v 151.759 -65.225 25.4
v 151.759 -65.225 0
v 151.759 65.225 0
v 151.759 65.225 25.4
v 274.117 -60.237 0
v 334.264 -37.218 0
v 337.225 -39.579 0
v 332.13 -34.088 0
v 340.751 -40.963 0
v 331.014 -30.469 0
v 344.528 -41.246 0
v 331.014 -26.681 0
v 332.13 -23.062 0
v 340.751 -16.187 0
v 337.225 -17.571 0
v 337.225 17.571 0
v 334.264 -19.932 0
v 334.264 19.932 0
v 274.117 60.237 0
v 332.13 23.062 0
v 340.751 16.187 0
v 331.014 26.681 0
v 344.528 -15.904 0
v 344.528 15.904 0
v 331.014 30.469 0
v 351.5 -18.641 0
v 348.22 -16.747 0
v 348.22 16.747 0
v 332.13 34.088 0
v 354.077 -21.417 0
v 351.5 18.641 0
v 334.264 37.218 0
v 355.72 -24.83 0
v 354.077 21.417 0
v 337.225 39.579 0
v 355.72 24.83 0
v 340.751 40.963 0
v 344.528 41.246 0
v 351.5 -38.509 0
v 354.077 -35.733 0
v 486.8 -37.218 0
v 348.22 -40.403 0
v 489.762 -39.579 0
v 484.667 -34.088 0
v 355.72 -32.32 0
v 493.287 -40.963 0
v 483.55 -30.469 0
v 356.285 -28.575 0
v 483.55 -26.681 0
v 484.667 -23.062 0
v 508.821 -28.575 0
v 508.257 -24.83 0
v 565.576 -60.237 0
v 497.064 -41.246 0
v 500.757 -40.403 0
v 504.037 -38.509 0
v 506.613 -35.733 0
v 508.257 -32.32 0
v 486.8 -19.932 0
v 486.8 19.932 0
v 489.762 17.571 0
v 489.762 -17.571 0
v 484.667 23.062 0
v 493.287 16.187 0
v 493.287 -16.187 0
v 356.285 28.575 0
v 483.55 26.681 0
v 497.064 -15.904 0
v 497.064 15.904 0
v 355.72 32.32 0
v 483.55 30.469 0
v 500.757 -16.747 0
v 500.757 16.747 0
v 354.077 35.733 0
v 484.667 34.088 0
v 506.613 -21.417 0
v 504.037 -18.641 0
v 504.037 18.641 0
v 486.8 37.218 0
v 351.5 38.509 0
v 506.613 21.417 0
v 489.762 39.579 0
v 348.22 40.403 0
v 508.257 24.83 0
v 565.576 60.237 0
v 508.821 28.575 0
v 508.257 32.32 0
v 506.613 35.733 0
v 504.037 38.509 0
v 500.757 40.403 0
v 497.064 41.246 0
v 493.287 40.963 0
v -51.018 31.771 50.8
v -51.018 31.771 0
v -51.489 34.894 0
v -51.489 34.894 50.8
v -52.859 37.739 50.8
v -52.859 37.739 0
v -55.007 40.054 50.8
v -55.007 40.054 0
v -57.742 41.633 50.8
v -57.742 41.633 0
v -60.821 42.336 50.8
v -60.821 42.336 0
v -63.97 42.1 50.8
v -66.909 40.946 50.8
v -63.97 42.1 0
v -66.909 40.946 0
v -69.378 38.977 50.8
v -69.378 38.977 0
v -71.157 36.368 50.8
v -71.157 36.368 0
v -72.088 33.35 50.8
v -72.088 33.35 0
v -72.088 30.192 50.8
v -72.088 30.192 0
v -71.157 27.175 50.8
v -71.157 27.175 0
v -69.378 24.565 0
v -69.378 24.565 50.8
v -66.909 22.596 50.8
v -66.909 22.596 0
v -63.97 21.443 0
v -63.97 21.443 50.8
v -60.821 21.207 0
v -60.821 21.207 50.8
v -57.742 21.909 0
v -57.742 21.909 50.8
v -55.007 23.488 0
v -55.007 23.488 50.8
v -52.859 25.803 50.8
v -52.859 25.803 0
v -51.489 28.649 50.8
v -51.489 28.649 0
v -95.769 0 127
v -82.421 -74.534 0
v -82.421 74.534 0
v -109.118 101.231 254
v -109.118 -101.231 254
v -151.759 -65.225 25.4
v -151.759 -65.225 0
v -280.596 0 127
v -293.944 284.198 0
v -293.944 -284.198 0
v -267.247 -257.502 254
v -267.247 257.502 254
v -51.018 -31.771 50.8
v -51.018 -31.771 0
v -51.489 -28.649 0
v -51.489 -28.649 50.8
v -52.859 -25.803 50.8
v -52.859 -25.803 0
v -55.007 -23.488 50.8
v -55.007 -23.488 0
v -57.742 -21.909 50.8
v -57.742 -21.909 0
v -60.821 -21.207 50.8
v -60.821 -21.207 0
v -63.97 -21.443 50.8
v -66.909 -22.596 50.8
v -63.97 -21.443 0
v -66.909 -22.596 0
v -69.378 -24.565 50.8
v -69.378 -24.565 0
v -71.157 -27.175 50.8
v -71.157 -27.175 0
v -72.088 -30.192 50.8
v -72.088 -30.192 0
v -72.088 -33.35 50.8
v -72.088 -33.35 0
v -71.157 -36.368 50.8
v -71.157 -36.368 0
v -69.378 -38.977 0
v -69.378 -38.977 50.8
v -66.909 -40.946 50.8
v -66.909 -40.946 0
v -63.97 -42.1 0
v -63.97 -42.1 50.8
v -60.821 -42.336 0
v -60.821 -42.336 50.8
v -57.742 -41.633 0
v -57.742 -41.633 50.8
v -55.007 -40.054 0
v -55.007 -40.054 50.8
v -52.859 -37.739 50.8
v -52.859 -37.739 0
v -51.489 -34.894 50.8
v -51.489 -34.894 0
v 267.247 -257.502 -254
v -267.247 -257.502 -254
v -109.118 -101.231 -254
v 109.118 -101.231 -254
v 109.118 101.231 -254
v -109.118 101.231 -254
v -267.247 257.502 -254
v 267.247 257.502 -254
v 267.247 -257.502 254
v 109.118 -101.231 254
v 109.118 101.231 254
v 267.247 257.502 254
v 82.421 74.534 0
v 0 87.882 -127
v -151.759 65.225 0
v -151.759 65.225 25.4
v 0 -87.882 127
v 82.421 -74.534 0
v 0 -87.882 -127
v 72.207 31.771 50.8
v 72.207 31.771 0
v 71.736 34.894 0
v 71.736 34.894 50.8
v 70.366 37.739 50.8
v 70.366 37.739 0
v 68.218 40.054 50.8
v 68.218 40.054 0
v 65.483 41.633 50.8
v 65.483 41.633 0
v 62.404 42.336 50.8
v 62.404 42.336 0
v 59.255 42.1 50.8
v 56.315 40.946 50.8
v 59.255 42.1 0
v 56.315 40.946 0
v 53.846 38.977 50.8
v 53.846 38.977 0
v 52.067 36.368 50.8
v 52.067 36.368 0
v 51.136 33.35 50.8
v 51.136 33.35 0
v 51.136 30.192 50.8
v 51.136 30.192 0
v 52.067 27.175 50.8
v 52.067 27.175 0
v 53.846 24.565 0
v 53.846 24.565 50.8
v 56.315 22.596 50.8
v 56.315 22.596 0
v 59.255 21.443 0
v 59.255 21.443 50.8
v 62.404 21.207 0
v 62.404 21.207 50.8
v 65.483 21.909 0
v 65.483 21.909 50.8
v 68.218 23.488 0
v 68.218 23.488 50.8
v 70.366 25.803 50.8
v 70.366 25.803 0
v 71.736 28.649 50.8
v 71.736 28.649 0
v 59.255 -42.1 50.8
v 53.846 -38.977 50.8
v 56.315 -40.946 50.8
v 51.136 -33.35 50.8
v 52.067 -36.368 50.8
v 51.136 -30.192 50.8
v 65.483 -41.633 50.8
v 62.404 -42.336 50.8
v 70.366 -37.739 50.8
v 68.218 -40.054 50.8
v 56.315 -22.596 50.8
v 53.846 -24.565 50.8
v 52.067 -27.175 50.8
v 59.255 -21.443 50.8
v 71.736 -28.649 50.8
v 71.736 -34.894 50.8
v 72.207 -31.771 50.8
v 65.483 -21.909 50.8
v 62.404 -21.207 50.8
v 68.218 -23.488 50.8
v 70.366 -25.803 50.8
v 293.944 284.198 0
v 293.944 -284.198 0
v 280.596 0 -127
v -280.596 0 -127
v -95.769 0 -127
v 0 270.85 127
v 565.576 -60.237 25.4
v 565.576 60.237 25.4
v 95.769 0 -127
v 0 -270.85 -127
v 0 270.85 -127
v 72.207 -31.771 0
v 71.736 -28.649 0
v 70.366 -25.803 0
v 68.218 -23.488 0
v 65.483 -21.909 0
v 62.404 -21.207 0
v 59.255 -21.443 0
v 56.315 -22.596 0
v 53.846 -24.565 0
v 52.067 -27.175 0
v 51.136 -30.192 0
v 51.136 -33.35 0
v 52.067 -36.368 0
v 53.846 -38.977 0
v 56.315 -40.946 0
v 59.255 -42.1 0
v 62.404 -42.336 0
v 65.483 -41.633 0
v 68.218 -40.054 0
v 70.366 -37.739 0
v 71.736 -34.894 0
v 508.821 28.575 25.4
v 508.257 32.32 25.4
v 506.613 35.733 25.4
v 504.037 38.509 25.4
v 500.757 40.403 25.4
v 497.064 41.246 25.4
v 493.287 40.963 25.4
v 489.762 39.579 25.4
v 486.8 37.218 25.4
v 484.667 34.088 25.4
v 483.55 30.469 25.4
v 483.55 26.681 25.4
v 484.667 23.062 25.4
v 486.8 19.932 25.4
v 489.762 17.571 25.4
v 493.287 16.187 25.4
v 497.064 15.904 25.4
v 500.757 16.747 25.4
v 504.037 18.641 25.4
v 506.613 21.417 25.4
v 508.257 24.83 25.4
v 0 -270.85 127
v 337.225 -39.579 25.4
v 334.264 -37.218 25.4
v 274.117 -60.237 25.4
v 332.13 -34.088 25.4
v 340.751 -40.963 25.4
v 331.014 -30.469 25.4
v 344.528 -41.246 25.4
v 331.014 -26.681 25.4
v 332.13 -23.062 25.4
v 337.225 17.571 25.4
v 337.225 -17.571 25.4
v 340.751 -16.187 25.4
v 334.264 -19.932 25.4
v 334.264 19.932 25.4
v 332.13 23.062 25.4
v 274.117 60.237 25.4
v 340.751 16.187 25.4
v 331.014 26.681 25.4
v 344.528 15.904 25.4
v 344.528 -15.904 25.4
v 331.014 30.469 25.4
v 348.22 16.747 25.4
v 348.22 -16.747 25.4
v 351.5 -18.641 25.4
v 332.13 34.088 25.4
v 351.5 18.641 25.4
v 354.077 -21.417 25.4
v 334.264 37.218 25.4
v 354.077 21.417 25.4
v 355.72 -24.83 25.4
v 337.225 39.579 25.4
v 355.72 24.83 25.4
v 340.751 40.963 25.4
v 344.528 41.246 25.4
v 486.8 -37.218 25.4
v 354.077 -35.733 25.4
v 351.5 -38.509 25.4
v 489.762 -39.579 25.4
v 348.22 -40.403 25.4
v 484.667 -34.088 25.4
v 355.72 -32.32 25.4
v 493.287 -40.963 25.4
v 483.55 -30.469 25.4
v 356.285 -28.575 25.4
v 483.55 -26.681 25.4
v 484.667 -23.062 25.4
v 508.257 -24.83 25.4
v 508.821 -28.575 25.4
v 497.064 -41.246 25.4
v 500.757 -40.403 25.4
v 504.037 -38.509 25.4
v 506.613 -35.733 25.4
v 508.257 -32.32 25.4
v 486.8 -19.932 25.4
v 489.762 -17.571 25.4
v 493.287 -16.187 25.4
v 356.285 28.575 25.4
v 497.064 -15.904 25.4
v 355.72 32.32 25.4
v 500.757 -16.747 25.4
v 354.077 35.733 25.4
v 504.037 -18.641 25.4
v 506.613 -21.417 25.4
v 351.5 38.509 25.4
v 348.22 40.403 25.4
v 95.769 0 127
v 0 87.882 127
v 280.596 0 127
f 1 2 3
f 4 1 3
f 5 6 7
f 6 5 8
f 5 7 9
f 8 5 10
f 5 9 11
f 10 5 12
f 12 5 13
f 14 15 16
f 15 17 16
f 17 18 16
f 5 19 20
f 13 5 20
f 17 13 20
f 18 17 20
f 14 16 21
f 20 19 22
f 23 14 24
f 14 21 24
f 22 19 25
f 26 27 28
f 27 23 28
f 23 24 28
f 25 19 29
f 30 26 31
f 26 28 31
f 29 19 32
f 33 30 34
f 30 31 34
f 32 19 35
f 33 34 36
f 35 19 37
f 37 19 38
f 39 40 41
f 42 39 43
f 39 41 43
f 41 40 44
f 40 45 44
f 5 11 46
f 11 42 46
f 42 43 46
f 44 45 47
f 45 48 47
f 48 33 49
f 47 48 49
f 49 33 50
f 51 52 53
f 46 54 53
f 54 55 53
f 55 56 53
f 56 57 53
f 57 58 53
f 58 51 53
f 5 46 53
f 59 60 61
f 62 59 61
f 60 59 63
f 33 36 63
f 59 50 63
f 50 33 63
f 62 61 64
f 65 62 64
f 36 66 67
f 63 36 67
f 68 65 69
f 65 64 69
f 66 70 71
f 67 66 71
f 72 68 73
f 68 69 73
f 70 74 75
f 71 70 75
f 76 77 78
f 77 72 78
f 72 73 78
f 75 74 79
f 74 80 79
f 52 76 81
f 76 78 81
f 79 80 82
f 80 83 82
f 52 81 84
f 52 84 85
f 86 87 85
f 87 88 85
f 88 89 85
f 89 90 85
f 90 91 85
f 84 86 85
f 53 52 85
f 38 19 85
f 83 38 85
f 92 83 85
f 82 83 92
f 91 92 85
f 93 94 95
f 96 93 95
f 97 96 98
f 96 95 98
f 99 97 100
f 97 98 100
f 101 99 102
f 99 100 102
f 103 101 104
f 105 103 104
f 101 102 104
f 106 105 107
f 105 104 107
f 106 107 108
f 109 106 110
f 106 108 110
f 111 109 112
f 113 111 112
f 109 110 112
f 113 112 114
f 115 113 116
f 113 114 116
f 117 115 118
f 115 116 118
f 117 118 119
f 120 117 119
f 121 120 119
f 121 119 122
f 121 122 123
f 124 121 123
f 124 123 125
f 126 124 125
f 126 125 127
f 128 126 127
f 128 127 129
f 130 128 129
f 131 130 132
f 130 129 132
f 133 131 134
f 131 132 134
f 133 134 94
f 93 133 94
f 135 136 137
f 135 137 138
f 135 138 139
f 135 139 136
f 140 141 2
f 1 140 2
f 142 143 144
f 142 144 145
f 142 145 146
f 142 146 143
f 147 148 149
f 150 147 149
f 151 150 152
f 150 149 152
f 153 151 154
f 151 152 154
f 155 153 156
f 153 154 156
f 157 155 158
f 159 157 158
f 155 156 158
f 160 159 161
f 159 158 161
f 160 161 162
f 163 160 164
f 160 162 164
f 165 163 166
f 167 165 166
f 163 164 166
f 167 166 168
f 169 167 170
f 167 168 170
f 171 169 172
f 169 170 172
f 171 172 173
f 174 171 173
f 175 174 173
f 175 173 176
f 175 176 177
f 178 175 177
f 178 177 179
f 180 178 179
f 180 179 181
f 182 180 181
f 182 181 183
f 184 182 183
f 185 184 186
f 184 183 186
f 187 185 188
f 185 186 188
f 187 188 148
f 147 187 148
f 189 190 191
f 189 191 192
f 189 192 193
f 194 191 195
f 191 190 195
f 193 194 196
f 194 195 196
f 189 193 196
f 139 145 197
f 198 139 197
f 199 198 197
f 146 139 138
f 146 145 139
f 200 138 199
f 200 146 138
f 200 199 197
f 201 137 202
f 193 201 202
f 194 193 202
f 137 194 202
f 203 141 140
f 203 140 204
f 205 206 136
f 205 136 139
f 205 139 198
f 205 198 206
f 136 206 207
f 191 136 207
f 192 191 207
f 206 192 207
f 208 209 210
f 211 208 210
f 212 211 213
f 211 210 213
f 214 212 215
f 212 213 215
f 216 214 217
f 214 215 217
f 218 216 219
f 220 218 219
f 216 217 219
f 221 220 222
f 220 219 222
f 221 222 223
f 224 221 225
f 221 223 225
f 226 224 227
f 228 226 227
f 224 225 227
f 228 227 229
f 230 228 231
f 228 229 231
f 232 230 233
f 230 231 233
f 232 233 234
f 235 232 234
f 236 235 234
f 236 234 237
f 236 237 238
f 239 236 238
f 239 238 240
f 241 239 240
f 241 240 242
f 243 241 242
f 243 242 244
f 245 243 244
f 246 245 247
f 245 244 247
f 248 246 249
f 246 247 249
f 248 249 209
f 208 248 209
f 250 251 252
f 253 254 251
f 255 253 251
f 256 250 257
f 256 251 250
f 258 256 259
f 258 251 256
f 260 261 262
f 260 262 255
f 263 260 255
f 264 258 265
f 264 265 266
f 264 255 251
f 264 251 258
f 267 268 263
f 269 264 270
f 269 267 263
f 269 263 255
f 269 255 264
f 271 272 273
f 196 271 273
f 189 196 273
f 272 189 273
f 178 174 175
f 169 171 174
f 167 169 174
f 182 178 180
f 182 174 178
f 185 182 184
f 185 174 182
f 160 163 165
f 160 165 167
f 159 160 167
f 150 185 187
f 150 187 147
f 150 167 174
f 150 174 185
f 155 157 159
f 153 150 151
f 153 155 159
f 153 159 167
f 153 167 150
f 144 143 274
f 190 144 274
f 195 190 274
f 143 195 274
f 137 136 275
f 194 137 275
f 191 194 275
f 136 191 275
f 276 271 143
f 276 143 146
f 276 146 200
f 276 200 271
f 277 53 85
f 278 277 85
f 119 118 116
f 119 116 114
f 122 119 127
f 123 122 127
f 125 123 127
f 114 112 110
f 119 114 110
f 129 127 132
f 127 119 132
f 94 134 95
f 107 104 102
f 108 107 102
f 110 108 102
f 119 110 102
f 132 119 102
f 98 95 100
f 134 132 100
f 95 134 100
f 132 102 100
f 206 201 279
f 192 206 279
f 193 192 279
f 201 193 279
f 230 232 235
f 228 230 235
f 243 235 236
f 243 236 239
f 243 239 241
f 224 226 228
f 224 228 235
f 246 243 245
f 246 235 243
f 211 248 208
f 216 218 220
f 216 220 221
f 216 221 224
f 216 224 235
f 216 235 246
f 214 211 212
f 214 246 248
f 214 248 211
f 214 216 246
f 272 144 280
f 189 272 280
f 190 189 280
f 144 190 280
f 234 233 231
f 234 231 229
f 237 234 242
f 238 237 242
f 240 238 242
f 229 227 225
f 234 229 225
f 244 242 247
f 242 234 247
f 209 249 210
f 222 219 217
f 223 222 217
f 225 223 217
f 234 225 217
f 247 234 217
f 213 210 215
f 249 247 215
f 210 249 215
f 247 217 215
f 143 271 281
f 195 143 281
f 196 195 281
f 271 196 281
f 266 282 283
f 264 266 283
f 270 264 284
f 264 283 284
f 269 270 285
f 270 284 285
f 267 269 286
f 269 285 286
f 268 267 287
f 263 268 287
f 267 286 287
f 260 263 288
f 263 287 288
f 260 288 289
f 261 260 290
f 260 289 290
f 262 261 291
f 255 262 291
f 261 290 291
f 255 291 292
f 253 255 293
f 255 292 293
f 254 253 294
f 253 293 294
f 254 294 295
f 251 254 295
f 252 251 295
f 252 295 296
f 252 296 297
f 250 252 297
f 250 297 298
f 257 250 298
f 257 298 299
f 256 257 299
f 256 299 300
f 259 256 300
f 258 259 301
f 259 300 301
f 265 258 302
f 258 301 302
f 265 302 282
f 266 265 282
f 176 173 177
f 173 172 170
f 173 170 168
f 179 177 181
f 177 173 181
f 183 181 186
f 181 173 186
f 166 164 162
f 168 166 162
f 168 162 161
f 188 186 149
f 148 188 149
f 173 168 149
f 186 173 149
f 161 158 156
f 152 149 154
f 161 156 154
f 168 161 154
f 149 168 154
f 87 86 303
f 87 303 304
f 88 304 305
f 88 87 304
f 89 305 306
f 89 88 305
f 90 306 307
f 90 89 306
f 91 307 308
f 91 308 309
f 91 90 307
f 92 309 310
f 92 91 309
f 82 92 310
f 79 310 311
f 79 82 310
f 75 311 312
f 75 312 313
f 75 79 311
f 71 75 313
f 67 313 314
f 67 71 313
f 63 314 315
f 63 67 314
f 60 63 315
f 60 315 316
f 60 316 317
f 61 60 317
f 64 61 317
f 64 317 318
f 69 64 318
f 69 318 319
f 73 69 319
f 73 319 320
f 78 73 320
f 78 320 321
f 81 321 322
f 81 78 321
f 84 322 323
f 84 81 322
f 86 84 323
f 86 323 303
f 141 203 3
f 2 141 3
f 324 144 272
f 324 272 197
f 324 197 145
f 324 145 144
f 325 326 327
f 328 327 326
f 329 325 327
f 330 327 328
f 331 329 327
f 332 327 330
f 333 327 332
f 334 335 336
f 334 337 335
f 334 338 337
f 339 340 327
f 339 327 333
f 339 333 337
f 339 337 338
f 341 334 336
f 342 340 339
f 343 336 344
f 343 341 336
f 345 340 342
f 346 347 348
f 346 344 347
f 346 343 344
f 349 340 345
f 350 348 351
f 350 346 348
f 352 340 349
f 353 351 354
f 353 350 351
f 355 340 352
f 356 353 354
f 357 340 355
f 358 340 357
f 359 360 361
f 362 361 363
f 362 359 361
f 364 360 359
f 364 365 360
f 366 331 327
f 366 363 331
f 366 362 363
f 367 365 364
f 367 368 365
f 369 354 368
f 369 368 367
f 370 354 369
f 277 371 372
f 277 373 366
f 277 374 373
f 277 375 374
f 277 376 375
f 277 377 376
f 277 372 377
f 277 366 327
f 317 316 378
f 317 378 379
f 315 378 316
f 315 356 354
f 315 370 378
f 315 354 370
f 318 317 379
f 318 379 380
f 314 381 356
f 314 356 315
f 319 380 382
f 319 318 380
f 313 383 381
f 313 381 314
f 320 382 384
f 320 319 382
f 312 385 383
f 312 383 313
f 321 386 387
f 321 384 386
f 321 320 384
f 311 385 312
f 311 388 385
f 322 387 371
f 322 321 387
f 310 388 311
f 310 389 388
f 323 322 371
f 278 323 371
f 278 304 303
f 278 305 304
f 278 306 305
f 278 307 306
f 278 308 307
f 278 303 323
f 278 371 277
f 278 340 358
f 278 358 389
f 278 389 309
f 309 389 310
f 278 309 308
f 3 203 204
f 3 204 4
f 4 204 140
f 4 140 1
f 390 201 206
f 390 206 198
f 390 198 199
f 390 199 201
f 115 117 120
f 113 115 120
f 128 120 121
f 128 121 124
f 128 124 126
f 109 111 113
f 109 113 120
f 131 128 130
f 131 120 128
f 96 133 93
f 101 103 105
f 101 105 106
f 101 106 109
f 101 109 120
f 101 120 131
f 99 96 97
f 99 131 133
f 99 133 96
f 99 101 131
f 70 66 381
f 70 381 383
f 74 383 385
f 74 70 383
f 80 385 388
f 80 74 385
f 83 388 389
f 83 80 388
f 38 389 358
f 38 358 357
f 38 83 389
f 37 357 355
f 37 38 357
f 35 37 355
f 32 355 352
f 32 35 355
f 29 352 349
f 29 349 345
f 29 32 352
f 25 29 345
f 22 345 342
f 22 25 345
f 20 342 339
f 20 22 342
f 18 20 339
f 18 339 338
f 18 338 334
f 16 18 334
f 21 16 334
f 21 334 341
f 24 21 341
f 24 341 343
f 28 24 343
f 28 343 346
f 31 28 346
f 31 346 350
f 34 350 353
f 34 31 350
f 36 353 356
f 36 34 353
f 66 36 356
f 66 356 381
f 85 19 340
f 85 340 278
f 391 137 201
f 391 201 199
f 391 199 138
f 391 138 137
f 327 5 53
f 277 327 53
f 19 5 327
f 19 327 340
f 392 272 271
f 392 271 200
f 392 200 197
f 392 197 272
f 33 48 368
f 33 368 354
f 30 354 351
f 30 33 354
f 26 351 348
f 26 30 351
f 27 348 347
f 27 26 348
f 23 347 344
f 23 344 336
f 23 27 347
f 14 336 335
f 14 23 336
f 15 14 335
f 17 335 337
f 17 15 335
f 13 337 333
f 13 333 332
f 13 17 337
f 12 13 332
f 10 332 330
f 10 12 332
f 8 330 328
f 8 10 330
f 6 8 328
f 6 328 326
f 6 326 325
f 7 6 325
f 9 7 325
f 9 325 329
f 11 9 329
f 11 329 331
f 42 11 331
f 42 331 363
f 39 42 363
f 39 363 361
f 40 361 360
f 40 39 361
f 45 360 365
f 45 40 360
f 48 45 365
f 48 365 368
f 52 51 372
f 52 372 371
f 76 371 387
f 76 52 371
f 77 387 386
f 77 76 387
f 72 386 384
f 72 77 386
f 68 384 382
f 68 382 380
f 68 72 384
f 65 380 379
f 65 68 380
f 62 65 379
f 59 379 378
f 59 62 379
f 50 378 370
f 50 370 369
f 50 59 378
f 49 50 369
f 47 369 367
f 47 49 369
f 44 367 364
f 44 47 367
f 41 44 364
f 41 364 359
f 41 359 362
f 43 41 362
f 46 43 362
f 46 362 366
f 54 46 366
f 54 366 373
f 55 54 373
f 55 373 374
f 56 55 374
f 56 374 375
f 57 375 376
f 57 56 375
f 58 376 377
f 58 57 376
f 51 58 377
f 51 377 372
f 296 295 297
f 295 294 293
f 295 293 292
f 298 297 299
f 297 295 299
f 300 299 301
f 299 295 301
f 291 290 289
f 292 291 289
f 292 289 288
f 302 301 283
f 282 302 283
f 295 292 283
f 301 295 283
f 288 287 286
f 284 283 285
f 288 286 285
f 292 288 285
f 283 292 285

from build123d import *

# Parameters (mm, degrees)
F0_W     = 303.5179972649
F0_H     = 130.4491758347
F1_DEPTH = 25.4
F2_R     = 10.594213
F3_DEPTH = 50.8
F4_W     = 291.4582490921
F4_H     = 120.4743683338
F4_R     = 12.70635
F5_DEPTH = 25.4
F6_W     = 587.8875851631
F6_H     = 568.3960914612
F6_W_2   = 164.8424863815
F6_H_2   = 149.0684151649
F7_DEPTH = 254
F7_TAPER = 6


with BuildPart() as f1:
    # F0 (on Top) → F1 (new body)
    with BuildSketch(Plane.XY):
        Rectangle(F0_W, F0_H)
    extrude(amount=F1_DEPTH)


with BuildPart() as f3:
    # F2 (on Top) → F3 (new body)
    with BuildSketch(Plane.XY):
        with Locations((61.6123527288, -31.7712649703)):
            Circle(F2_R)
    extrude(amount=F3_DEPTH)


with BuildPart() as f3b:
    # F2 (on Top) → F3, piece 2 (new body)
    with BuildSketch(Plane.XY):
        with Locations((61.6123527288, 31.7712649703)):
            Circle(F2_R)
    extrude(amount=F3_DEPTH)


with BuildPart() as f3c:
    # F2 (on Top) → F3, piece 3 (new body)
    with BuildSketch(Plane.XY):
        with Locations((-61.6123527288, 31.7712649703)):
            Circle(F2_R)
    extrude(amount=F3_DEPTH)


with BuildPart() as f3d:
    # F2 (on Top) → F3, piece 4 (new body)
    with BuildSketch(Plane.XY):
        with Locations((-61.6123527288, -31.7712649703)):
            Circle(F2_R)
    extrude(amount=F3_DEPTH)


with BuildPart() as f5:
    # F4 (on Top) → F5 (new body)
    with BuildSketch(Plane.XY):
        with Locations((419.846534729, 0)):
            Rectangle(F4_W, F4_H)
        with Locations((343.5781598091, -28.575)):
            Circle(F4_R, mode=Mode.SUBTRACT)
        with Locations((496.1149096489, -28.575)):
            Circle(F4_R, mode=Mode.SUBTRACT)
        with Locations((343.5781598091, 28.575)):
            Circle(F4_R, mode=Mode.SUBTRACT)
        with Locations((496.1149096489, 28.575)):
            Circle(F4_R, mode=Mode.SUBTRACT)
    extrude(amount=F5_DEPTH)


with BuildPart() as f7:
    # F6 (on Top) → F7 (new body, symmetric)
    with BuildSketch(Plane.XY):
        Rectangle(F6_W, F6_H)
        Rectangle(F6_W_2, F6_H_2, mode=Mode.SUBTRACT)
    extrude(amount=F7_DEPTH, both=True, taper=F7_TAPER)


solid = Compound([f1.part, f3.part, f3b.part, f3c.part, f3d.part, f5.part, f7.part])
